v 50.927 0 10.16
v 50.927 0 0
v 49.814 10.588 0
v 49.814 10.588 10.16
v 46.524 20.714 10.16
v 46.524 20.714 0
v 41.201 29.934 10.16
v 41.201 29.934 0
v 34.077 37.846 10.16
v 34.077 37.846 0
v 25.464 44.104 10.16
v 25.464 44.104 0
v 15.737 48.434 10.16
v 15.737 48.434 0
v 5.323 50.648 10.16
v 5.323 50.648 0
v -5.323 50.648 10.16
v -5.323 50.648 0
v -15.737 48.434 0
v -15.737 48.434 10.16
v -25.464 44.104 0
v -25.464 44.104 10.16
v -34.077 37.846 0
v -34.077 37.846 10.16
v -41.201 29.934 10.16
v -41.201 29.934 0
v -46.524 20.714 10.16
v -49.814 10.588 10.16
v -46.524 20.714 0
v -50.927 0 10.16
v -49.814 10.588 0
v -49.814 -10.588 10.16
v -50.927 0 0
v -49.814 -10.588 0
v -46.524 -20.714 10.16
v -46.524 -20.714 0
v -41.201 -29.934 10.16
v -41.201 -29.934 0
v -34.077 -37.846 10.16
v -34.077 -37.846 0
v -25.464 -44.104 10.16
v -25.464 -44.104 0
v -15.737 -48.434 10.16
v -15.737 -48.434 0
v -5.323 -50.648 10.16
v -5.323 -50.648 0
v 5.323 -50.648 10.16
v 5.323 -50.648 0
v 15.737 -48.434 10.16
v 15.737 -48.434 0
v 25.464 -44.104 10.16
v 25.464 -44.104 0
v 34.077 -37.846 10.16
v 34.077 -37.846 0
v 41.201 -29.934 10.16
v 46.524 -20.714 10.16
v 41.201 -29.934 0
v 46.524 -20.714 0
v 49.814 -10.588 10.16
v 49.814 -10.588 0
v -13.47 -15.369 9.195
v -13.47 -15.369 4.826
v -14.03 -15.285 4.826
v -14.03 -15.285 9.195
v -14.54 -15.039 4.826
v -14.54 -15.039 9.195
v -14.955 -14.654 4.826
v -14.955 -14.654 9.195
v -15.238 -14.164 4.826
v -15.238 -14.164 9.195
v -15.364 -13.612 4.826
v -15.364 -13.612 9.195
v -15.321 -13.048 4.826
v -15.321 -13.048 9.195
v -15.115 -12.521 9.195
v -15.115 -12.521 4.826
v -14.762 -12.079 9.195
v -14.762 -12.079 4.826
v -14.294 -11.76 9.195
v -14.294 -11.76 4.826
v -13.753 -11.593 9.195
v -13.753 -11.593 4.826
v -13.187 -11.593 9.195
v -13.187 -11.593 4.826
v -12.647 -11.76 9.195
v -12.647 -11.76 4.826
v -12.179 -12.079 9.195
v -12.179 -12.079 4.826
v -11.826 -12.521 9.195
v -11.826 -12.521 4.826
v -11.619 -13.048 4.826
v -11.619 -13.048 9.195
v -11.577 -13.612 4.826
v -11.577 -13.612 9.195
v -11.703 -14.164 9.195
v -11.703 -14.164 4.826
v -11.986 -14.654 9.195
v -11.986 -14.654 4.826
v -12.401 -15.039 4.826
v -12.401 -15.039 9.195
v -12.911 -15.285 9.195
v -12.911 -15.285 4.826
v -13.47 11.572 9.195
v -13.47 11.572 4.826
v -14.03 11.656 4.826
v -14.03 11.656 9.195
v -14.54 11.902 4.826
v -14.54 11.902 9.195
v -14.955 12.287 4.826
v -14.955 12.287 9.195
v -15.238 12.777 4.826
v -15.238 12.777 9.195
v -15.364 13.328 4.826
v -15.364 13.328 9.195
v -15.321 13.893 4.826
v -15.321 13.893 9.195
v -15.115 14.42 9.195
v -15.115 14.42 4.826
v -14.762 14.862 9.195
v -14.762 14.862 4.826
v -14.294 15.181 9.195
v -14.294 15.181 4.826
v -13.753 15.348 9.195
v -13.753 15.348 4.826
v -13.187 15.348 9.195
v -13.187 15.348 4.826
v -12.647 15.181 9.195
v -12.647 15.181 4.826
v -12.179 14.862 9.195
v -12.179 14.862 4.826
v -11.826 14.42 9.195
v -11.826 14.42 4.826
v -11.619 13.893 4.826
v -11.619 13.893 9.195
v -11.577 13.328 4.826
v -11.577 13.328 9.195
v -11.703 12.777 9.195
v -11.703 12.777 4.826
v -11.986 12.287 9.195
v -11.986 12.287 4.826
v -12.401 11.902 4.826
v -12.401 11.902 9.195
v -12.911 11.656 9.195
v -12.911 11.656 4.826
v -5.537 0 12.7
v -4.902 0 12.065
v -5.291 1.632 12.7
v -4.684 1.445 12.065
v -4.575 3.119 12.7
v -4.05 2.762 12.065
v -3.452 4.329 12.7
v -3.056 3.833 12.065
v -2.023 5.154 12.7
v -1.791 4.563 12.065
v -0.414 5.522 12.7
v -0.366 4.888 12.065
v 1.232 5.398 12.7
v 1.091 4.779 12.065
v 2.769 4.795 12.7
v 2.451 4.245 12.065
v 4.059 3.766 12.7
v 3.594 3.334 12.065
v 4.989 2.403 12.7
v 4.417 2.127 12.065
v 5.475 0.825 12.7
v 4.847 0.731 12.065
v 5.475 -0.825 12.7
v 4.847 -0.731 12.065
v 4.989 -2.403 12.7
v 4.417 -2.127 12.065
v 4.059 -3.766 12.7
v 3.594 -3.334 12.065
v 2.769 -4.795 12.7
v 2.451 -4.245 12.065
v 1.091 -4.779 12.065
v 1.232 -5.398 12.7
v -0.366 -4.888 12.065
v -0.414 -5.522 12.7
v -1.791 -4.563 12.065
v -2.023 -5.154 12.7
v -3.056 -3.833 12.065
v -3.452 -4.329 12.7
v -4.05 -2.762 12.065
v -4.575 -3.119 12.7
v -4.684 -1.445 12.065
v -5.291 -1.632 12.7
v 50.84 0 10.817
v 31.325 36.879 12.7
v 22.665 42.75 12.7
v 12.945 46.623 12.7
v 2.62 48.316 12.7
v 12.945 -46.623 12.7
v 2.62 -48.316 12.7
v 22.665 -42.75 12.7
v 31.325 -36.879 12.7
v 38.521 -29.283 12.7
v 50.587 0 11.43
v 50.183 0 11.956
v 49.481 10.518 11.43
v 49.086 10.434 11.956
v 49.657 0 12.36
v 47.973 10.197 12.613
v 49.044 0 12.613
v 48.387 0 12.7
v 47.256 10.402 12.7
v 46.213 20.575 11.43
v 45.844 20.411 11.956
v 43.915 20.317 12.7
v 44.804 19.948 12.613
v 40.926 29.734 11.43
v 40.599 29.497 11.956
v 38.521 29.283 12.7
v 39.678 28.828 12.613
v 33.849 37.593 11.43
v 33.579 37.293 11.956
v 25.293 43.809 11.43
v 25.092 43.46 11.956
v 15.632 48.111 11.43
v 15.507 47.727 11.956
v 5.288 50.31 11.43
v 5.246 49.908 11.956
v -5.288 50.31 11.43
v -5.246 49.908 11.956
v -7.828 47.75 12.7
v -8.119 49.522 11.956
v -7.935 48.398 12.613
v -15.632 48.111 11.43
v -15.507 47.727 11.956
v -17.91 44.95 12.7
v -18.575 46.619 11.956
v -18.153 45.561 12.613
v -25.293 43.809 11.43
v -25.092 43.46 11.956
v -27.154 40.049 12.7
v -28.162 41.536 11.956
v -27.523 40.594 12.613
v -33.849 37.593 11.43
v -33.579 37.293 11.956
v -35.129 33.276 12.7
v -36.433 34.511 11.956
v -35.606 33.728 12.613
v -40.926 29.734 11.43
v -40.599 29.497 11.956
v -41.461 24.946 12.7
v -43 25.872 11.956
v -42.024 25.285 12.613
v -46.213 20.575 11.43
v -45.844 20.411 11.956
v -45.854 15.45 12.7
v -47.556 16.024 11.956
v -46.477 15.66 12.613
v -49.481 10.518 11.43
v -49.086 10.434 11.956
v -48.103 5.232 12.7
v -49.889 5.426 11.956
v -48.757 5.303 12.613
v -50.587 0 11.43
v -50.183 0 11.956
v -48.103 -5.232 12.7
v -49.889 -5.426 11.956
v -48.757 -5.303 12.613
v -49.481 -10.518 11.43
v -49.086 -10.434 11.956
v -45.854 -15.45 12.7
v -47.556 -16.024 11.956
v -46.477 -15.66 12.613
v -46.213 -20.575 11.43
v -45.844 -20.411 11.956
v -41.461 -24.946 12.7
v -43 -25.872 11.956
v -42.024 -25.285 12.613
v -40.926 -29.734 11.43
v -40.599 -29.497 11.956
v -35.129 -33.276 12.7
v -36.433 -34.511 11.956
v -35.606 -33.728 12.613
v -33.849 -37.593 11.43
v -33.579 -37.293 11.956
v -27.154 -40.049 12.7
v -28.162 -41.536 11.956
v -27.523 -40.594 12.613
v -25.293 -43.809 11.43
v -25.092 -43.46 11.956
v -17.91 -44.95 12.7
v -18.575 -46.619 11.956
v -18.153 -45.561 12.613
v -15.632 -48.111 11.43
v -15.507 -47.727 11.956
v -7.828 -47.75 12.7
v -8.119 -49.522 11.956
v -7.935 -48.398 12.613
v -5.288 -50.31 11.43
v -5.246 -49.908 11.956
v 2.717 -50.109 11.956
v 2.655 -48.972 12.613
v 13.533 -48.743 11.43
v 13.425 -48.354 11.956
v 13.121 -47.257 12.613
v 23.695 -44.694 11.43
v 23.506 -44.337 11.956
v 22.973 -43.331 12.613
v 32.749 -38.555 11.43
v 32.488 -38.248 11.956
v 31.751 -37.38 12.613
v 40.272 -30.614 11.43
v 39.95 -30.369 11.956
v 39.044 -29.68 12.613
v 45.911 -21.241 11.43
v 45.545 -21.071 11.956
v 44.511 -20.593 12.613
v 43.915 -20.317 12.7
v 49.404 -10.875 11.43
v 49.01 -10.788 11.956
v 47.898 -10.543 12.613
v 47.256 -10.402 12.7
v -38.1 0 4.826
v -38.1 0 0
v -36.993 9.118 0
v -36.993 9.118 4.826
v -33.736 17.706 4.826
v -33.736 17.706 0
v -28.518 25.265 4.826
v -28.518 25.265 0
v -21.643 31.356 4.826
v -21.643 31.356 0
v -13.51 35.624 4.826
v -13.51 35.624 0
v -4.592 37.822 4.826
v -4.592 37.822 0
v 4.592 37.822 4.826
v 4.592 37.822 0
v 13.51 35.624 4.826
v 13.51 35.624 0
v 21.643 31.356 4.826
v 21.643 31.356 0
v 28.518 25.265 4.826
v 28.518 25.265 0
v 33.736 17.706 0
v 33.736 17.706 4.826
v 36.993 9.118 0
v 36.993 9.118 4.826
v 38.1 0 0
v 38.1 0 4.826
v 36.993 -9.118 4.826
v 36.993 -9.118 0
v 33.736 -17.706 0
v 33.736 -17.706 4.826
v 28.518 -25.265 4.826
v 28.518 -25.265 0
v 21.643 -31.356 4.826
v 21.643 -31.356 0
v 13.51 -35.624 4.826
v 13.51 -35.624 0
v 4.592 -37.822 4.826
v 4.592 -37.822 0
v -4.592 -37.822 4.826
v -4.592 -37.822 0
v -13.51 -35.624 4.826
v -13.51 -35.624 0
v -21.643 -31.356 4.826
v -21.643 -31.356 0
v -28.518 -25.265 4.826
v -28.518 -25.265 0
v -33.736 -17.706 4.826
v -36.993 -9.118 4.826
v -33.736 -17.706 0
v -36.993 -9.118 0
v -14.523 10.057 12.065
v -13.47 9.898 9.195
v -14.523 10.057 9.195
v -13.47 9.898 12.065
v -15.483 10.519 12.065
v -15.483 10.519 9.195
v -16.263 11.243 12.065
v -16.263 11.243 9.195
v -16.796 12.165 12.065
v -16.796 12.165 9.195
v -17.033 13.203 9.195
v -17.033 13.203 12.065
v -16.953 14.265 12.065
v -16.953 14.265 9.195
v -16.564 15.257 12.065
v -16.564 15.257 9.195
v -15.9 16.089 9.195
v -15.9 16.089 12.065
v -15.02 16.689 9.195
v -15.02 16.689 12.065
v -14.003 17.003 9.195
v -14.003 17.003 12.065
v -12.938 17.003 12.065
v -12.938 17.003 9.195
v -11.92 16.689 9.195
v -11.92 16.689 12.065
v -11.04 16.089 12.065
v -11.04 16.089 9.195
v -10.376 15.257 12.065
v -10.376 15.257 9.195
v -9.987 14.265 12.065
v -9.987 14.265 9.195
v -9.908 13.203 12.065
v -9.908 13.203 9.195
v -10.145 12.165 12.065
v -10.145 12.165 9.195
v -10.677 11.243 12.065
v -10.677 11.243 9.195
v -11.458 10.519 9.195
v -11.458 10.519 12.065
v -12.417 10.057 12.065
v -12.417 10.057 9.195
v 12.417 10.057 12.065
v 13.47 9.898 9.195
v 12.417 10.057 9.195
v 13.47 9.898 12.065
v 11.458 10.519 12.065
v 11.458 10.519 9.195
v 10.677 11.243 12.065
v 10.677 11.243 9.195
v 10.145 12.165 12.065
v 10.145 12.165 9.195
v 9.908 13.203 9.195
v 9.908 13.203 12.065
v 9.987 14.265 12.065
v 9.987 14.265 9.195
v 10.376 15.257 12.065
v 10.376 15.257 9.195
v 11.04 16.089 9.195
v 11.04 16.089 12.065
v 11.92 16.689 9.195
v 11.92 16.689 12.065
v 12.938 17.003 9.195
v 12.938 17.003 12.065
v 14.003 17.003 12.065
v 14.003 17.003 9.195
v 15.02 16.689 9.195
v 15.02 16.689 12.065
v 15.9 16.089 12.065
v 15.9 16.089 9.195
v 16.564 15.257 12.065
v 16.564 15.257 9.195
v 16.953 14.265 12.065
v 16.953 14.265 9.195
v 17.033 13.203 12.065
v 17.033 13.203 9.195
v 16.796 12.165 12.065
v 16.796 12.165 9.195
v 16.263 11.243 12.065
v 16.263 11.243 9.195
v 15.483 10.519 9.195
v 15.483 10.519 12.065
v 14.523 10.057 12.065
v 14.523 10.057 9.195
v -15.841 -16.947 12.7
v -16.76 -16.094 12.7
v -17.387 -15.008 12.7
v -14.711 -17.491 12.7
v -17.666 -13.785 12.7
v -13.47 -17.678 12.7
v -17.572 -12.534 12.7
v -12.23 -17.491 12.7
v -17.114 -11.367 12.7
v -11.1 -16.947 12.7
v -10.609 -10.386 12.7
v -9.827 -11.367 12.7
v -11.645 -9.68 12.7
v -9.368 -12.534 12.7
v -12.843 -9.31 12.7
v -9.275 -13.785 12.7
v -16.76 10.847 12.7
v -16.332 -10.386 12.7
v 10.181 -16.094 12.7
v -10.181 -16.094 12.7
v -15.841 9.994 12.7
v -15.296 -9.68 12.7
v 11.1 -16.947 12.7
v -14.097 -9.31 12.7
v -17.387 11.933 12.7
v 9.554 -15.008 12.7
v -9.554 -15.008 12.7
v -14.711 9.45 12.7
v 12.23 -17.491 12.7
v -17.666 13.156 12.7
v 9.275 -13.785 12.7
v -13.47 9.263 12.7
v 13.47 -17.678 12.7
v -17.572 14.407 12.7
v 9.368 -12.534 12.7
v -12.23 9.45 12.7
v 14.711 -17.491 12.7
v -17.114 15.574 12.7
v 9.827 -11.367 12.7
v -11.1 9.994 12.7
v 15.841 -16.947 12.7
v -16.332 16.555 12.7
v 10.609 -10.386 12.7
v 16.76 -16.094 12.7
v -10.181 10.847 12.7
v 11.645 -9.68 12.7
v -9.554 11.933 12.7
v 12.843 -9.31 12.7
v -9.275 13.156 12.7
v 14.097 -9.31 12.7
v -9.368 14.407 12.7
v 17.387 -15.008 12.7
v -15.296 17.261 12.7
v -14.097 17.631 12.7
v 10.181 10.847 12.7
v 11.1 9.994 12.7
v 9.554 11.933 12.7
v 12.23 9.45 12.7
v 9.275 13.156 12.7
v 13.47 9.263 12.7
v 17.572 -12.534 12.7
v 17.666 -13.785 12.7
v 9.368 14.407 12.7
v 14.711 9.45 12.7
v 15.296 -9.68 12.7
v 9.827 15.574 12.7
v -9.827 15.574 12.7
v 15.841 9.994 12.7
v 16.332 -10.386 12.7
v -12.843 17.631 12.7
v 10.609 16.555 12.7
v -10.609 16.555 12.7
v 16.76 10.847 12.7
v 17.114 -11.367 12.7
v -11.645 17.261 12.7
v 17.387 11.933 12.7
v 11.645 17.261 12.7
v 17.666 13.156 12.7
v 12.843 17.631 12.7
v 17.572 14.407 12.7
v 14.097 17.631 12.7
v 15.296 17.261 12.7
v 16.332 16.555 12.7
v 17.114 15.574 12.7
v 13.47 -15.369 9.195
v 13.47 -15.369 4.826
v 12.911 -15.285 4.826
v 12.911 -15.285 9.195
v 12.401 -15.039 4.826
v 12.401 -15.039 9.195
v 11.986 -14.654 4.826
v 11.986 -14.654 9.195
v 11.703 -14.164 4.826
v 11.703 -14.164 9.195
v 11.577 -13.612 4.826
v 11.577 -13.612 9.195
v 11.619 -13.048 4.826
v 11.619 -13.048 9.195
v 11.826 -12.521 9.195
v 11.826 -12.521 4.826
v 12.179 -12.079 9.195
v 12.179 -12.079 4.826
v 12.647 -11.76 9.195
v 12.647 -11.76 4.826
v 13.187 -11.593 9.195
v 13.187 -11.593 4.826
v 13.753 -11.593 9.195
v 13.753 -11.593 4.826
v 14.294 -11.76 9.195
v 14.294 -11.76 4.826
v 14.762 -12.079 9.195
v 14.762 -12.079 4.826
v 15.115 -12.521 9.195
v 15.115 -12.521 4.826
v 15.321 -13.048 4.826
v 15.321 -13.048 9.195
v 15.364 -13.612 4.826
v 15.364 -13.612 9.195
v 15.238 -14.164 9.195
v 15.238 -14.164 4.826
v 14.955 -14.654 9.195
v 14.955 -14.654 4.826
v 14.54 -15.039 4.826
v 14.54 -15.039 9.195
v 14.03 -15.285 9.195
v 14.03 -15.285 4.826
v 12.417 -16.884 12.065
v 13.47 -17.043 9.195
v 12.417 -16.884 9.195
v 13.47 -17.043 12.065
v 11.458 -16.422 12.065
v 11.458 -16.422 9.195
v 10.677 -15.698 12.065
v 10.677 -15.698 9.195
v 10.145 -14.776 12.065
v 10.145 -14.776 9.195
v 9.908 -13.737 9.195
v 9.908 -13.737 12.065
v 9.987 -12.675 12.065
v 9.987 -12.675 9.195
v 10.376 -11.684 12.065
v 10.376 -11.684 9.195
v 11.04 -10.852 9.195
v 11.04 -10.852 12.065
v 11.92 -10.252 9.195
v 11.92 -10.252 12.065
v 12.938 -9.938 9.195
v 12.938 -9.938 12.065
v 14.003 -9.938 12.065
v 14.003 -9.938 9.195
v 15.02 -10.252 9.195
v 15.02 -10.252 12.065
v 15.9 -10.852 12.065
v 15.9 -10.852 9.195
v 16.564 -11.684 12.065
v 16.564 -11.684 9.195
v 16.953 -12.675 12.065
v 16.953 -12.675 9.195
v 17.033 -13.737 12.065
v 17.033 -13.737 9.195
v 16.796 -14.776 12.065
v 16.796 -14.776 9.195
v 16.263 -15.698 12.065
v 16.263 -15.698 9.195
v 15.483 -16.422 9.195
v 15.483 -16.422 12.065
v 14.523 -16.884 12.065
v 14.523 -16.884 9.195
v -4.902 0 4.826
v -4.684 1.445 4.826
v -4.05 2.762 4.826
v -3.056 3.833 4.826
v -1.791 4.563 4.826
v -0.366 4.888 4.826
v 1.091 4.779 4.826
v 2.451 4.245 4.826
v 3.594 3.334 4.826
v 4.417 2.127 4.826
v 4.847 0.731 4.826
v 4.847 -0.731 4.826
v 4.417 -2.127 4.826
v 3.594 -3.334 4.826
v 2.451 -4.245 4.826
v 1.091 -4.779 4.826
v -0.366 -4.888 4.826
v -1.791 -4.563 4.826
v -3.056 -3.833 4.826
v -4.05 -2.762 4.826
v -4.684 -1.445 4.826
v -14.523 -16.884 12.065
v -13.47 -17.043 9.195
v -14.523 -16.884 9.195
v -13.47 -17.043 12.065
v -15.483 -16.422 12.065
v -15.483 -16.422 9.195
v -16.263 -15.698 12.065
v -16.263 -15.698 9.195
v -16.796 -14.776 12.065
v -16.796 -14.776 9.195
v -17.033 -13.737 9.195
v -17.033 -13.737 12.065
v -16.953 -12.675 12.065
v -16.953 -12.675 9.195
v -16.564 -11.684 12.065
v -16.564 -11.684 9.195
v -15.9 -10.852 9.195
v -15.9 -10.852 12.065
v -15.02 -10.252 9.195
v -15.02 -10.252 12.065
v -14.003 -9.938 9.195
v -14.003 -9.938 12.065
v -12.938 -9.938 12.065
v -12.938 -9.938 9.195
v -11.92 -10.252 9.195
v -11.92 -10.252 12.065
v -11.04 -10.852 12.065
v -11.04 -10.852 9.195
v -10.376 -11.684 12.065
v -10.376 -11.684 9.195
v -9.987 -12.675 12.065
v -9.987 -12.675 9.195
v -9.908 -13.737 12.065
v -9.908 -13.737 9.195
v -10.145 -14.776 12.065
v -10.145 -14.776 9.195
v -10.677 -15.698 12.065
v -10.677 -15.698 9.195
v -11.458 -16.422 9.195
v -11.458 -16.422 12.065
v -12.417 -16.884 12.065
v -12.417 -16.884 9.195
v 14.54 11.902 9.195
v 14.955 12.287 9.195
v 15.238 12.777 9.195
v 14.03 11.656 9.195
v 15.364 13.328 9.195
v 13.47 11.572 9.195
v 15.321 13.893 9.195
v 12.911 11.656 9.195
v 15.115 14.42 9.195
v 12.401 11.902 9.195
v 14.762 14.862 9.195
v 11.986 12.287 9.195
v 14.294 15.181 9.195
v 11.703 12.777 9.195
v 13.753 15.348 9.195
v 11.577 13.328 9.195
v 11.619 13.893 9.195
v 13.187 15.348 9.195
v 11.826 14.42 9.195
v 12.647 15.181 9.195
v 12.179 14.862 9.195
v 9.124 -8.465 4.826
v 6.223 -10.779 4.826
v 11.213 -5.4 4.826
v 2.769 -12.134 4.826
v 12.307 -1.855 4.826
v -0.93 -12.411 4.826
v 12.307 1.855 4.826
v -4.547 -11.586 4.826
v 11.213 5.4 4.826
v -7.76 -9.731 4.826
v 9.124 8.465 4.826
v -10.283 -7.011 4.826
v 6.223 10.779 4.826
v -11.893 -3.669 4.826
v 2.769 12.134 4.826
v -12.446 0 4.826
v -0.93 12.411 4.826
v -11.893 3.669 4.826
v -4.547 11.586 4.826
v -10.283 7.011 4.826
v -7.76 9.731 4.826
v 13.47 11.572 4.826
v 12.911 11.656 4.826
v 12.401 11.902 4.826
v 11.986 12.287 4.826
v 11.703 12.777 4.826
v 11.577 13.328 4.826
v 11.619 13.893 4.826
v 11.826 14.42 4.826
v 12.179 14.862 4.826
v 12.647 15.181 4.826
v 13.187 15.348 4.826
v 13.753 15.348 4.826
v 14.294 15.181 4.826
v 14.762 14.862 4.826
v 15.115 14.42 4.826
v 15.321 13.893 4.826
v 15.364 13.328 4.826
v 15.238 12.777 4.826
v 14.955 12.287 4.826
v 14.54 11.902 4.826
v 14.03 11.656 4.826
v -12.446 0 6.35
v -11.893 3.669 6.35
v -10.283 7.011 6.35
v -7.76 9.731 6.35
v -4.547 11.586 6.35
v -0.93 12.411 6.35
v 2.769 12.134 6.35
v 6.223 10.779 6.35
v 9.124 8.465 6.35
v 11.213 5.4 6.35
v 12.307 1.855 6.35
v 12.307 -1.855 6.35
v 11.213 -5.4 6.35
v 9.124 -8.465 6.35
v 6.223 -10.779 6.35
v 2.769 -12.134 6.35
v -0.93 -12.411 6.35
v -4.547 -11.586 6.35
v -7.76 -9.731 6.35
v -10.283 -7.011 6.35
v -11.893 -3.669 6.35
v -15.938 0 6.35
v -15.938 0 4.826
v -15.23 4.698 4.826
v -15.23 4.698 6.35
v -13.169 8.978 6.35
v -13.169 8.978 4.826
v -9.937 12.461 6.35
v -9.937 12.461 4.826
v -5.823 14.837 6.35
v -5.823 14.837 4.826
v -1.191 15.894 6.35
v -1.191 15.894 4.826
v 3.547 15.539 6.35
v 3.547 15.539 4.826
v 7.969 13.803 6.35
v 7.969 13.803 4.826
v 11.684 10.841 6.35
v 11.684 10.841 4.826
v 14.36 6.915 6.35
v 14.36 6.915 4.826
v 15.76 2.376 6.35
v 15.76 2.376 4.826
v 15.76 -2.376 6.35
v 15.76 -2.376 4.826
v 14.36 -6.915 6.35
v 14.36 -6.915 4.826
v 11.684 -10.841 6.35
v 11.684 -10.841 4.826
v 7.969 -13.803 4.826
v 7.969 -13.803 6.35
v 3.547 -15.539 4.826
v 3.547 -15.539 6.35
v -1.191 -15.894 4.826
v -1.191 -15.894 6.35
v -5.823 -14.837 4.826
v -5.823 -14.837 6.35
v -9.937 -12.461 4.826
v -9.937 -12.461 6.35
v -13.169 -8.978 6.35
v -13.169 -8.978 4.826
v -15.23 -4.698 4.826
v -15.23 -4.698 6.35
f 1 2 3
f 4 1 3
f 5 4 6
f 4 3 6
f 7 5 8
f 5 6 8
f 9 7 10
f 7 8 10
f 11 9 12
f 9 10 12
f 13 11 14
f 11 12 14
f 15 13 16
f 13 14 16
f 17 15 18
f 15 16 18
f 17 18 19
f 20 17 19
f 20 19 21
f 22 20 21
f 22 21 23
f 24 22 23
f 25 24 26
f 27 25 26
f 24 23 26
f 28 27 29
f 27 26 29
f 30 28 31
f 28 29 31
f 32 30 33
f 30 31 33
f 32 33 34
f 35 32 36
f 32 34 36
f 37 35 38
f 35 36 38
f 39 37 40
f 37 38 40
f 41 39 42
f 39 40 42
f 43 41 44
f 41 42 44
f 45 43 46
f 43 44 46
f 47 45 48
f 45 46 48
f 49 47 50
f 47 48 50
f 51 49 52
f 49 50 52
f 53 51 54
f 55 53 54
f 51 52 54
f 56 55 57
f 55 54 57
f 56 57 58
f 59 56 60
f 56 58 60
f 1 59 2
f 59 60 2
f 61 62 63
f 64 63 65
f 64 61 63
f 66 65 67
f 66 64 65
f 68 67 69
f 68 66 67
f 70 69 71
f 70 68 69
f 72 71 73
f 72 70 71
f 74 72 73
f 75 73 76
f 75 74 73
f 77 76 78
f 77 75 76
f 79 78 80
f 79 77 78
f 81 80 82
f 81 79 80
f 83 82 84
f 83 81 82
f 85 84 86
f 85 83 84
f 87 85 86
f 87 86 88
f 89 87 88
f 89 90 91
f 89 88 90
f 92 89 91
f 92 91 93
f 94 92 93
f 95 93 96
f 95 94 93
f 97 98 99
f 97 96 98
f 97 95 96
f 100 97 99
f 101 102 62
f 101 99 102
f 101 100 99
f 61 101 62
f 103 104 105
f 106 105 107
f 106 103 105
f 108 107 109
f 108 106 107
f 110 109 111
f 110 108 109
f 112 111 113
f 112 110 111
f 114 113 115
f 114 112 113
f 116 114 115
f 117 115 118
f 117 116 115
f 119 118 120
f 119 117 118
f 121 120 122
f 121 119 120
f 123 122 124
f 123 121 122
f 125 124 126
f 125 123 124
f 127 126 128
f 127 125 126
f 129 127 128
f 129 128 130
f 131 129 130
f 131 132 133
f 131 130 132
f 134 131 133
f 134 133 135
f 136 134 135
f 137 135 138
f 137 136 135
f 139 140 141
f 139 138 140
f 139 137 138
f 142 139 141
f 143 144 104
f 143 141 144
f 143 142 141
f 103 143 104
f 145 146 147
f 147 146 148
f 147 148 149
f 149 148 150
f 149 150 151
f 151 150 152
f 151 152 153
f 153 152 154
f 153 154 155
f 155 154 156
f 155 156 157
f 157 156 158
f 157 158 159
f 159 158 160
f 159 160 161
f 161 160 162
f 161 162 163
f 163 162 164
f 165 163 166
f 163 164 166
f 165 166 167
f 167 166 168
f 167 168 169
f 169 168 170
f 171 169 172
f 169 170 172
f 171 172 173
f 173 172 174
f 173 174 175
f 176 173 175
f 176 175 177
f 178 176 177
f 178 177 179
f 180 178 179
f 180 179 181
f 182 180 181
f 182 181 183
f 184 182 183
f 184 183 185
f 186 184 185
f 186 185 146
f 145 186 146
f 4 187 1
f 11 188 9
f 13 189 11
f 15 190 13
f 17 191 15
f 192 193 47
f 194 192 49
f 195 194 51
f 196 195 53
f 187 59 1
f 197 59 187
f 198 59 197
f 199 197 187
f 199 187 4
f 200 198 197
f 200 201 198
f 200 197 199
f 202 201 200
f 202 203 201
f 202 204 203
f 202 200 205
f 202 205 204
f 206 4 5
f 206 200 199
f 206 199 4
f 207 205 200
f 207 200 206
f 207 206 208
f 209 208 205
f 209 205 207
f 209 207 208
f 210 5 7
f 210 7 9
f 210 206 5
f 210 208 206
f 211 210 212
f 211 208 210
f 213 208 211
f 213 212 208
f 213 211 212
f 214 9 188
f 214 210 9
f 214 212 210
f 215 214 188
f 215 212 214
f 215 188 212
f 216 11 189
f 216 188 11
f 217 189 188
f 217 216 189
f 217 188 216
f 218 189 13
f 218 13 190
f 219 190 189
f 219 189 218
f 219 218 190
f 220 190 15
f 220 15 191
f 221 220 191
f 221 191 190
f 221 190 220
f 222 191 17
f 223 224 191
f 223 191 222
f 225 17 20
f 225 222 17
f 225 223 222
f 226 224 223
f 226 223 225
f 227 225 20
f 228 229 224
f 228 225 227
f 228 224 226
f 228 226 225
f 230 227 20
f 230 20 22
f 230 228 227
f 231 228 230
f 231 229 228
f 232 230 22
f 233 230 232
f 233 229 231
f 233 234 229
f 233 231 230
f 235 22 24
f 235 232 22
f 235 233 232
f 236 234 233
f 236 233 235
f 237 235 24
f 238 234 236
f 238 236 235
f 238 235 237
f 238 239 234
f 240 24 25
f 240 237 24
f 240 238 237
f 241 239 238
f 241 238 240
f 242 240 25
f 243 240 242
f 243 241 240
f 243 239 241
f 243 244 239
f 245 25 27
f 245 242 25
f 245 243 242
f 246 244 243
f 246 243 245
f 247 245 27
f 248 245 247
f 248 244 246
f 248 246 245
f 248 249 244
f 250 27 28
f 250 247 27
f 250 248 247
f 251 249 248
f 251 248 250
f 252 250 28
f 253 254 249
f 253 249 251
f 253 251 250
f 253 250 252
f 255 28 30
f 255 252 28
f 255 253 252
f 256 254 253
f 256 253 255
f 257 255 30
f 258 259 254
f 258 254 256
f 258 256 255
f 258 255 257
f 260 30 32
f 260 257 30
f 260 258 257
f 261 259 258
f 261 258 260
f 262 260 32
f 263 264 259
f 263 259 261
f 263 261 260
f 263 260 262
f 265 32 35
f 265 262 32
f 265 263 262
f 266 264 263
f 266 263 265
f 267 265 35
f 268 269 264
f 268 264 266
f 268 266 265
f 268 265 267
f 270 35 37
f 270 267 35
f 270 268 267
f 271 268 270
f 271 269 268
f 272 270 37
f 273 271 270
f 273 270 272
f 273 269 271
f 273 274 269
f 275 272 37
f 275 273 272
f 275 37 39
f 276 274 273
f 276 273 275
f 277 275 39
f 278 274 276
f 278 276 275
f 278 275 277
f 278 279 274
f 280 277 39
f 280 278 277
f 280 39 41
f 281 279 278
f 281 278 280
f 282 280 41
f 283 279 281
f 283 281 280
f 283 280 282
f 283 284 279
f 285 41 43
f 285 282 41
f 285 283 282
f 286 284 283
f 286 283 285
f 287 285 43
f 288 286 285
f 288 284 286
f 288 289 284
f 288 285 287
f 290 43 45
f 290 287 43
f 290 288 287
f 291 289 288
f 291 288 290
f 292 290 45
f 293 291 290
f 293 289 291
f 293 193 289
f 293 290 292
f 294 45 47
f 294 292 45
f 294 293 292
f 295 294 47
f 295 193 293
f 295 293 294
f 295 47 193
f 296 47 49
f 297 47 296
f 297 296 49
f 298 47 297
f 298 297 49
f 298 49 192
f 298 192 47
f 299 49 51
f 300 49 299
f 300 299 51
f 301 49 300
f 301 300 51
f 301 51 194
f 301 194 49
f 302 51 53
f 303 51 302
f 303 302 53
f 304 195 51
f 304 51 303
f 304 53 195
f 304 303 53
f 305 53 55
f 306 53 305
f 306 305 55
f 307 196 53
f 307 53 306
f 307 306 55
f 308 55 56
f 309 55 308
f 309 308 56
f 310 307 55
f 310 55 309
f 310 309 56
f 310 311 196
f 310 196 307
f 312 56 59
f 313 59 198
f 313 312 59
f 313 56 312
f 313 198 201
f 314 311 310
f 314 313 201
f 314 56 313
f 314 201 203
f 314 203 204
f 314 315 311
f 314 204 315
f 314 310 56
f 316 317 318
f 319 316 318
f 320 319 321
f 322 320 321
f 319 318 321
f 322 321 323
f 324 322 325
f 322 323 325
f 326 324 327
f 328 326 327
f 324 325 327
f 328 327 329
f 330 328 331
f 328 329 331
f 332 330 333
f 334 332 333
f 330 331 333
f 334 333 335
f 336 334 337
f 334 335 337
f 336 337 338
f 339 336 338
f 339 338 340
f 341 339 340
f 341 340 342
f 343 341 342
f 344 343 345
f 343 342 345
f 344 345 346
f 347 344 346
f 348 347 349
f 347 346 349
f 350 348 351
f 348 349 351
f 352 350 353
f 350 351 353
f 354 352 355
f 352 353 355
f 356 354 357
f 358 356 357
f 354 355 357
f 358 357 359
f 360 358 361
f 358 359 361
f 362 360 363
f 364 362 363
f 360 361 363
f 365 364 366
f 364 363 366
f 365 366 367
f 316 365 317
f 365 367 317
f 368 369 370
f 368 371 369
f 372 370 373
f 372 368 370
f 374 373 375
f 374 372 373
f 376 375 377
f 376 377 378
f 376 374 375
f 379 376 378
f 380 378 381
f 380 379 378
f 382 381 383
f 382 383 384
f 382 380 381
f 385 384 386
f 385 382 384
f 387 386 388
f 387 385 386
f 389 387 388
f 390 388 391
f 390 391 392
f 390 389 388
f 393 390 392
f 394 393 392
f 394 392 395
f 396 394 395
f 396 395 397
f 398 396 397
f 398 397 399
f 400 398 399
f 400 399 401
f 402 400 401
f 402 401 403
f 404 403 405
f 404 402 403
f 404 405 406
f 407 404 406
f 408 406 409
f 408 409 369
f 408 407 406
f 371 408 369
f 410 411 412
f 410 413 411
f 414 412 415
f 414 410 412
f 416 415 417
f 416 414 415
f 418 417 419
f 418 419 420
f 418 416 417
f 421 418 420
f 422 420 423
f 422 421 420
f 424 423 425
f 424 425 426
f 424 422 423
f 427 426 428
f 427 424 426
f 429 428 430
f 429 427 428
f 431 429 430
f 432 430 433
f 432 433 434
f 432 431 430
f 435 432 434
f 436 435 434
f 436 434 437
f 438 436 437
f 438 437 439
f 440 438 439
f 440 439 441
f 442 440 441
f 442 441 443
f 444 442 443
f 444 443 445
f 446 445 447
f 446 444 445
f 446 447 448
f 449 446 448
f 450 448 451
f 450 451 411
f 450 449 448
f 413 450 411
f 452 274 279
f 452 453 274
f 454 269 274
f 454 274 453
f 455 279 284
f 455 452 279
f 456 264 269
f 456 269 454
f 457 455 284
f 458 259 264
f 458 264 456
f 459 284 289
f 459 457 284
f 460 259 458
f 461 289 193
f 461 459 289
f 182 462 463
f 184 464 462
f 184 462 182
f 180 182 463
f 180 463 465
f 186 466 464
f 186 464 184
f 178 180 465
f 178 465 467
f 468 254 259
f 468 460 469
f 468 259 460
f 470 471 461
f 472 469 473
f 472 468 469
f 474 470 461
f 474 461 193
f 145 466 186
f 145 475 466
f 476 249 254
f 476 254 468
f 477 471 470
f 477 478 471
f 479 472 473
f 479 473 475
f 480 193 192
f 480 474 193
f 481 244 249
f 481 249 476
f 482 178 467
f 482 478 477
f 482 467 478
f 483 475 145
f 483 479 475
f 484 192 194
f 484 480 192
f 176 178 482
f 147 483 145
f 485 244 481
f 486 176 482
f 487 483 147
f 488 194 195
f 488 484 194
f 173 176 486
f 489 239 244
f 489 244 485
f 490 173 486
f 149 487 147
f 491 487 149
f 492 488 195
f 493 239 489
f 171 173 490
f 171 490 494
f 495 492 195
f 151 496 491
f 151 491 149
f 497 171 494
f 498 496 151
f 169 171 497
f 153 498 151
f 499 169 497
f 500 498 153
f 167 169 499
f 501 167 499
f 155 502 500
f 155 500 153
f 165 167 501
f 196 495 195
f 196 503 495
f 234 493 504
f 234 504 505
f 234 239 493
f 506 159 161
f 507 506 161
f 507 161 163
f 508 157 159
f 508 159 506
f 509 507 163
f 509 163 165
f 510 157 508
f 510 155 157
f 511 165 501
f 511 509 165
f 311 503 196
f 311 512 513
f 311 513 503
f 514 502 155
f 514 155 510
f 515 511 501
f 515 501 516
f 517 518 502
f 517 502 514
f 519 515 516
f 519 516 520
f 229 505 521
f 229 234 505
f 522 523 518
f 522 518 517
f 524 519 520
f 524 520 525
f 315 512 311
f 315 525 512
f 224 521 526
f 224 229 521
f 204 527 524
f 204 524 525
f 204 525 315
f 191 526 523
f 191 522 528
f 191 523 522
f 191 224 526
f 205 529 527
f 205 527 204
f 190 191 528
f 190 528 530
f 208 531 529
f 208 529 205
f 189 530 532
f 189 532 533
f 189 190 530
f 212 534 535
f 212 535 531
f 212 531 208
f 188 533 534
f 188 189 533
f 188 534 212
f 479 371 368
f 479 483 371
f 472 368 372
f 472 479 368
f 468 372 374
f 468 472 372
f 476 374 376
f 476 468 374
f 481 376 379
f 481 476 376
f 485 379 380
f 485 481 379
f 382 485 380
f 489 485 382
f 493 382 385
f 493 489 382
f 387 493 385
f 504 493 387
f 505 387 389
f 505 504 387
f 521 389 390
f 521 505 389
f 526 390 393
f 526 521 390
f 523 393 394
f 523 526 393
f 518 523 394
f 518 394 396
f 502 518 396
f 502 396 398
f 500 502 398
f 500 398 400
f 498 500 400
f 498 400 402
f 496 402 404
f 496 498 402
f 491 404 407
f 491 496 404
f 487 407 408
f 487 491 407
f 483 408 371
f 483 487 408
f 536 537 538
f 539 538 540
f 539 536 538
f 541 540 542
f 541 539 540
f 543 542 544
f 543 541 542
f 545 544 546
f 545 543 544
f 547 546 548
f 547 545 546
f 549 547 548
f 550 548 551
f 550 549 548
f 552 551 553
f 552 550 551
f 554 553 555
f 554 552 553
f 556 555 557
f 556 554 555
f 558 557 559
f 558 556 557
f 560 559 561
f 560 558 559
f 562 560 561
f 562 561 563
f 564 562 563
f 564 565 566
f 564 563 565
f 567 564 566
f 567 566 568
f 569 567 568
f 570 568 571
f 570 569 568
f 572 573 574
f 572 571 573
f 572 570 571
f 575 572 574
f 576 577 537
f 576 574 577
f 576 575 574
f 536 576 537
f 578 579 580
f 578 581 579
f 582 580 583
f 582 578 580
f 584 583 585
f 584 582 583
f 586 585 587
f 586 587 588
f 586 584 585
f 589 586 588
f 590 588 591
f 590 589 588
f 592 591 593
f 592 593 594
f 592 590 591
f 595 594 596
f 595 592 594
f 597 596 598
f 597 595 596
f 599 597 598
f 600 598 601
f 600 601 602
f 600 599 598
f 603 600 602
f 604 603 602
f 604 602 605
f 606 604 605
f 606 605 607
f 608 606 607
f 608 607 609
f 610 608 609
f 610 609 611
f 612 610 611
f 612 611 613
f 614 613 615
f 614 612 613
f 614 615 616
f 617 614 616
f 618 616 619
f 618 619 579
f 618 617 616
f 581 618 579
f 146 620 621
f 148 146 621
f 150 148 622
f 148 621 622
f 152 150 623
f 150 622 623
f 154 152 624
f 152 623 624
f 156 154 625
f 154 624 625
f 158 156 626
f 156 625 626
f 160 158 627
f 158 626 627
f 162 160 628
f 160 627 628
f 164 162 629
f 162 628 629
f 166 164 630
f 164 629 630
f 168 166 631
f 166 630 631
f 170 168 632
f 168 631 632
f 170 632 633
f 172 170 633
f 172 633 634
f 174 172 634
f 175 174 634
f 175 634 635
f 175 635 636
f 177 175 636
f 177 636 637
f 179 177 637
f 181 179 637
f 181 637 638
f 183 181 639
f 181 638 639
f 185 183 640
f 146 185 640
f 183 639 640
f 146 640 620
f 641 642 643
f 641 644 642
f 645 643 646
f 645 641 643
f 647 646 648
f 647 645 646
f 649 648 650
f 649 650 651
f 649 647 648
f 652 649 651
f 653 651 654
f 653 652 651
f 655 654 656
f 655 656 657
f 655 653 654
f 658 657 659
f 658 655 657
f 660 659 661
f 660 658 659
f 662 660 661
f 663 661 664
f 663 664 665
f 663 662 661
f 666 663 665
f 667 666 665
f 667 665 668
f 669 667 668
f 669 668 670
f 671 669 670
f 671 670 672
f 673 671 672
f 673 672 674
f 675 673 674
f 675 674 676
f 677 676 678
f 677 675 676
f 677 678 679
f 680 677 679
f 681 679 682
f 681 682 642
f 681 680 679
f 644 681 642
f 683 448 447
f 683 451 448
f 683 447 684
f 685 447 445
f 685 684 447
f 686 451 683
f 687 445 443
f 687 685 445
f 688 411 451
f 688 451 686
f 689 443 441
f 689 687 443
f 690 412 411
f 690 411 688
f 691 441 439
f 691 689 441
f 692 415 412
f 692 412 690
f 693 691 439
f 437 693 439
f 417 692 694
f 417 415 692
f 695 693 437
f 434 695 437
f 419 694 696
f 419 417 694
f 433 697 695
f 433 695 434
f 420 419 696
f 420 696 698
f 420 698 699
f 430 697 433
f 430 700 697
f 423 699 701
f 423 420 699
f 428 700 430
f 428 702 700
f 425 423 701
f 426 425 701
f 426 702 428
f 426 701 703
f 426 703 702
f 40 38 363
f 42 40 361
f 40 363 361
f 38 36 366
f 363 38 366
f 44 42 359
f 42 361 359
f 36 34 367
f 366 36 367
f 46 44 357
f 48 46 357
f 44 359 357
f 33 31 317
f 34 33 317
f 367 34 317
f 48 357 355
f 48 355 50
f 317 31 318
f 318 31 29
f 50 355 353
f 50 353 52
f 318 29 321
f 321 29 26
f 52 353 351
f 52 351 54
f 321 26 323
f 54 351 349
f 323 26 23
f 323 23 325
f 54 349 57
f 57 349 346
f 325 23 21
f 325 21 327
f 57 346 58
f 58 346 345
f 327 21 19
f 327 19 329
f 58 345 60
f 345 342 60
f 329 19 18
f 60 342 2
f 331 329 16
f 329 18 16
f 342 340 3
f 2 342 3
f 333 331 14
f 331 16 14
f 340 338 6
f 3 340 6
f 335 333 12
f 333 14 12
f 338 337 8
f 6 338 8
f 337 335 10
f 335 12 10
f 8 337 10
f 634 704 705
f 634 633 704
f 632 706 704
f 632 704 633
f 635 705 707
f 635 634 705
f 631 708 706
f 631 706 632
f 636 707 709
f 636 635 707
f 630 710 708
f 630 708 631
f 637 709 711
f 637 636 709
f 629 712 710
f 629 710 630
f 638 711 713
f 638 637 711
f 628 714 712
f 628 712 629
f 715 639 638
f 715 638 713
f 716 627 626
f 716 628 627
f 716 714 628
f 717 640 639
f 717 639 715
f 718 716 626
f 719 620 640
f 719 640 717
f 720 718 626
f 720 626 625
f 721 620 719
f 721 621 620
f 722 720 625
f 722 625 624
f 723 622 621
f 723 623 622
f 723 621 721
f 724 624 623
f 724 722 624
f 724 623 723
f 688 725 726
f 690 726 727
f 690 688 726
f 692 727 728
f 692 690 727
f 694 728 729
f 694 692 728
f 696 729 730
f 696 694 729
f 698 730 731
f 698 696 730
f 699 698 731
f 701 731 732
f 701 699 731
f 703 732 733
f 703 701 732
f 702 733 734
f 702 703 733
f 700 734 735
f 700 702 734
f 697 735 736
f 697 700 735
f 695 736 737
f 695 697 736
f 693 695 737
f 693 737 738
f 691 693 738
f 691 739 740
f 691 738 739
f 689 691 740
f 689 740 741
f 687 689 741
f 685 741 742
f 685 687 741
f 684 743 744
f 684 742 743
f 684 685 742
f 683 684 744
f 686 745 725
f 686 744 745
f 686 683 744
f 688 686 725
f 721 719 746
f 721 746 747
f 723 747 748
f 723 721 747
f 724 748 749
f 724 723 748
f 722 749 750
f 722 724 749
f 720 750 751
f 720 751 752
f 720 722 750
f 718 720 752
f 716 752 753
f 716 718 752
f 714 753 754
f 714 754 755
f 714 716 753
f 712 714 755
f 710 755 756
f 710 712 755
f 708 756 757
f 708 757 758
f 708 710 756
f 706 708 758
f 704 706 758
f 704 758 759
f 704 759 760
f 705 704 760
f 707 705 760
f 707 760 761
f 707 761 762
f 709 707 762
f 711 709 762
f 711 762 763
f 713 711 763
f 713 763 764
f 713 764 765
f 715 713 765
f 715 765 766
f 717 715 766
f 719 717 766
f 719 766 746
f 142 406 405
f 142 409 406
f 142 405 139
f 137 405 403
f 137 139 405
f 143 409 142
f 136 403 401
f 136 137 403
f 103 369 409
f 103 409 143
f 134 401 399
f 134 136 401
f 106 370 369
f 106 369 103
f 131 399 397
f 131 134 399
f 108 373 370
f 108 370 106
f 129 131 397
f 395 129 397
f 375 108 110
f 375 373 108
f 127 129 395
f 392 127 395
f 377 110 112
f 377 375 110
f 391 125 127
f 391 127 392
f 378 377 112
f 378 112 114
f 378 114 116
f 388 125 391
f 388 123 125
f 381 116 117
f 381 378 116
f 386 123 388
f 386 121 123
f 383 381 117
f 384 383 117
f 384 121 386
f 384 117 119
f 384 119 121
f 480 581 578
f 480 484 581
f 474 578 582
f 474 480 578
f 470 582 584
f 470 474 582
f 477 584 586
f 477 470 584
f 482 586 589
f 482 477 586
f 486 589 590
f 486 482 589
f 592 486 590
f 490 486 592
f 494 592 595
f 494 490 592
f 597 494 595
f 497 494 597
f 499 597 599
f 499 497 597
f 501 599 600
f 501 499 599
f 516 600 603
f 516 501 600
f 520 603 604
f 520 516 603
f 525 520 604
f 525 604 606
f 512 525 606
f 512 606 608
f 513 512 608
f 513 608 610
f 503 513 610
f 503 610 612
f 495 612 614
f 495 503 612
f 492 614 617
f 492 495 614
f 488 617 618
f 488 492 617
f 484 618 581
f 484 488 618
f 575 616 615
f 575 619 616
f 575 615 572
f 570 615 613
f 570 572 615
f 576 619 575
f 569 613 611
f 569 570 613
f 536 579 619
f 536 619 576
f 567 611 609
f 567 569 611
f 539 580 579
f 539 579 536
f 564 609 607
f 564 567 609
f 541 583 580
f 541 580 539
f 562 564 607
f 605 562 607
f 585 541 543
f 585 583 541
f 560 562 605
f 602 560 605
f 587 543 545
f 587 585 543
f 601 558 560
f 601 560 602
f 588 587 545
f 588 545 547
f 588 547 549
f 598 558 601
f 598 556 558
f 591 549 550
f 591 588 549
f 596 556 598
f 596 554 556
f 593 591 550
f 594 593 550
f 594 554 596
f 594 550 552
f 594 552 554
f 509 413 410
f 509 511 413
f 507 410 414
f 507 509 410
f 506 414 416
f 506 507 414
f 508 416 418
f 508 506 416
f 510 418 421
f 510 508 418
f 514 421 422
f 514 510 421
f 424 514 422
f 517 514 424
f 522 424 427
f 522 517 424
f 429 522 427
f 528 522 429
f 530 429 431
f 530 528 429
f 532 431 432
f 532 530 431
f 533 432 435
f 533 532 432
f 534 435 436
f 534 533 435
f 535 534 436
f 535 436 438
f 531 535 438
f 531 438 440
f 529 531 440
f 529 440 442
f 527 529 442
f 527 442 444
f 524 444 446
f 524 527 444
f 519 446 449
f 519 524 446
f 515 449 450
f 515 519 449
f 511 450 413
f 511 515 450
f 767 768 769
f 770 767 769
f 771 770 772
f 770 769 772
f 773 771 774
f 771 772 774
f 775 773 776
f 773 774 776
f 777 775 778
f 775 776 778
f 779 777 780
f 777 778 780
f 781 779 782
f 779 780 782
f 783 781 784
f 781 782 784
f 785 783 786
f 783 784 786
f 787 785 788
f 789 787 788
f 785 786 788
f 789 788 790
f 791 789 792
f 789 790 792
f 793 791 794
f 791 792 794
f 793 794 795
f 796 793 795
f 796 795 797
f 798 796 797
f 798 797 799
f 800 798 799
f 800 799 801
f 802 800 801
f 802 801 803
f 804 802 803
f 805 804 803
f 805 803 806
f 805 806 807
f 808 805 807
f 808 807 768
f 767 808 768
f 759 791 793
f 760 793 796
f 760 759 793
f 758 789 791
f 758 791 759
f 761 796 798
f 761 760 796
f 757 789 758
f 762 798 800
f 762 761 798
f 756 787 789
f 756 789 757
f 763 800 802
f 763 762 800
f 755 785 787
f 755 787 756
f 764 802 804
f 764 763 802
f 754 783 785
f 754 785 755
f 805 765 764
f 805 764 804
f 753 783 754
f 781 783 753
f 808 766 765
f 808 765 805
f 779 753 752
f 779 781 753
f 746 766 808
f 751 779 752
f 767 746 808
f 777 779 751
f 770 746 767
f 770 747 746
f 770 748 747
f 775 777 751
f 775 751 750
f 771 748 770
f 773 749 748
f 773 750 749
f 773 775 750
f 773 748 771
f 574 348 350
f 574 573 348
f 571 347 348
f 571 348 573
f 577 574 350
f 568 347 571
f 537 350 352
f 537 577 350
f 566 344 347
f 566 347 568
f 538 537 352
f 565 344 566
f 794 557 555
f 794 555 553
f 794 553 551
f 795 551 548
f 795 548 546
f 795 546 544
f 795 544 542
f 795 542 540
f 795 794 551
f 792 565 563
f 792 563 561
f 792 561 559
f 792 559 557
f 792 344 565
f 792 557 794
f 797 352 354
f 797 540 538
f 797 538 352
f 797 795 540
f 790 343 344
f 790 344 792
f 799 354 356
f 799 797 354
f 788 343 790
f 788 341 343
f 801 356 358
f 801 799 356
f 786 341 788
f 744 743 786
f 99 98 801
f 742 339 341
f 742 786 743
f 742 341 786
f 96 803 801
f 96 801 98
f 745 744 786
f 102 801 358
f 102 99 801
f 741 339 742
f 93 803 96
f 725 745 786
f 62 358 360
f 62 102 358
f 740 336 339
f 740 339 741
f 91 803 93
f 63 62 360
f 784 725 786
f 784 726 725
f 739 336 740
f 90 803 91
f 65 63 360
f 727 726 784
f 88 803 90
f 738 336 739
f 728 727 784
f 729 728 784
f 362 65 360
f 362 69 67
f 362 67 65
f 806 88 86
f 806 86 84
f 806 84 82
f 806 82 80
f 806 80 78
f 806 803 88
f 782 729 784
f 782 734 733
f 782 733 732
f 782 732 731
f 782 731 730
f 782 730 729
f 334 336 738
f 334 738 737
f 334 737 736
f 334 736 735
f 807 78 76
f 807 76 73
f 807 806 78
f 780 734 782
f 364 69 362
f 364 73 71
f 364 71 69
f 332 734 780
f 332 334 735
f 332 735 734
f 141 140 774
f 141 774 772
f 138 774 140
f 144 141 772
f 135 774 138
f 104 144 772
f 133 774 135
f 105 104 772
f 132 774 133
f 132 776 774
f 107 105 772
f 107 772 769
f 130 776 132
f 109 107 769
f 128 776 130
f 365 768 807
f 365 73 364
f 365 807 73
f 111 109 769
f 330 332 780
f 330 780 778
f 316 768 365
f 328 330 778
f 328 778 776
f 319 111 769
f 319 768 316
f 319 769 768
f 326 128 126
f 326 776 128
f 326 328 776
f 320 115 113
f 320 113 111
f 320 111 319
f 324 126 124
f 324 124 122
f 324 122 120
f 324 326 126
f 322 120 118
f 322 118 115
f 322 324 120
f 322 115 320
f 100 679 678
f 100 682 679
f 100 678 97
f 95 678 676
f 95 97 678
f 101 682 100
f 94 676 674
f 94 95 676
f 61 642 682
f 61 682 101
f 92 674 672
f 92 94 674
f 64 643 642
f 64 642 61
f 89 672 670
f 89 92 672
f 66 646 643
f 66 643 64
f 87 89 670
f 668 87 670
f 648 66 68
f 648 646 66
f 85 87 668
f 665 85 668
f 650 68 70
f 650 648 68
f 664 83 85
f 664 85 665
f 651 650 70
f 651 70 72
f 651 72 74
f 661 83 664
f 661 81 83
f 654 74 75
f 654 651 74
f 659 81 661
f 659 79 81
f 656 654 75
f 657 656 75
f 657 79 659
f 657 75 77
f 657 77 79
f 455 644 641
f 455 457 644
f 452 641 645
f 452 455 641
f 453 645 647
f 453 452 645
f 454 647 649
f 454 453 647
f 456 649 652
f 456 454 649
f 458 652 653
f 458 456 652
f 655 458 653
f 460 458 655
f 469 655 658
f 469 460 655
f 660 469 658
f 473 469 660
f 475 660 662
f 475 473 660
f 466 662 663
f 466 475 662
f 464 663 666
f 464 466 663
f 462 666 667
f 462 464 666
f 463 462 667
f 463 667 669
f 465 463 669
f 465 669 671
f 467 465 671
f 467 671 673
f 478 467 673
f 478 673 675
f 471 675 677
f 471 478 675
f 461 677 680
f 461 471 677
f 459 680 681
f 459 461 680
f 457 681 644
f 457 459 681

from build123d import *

# Parameters (mm, degrees)
SKETCH1_R                                     = 50.927
BOSS_EXTRUDE1_DEPTH                           = 12.7
W_0_386_DIAMETER_HOLE1_D                      = 9.8044
W_0_386_DIAMETER_HOLE1_CSINK_D                = 11.0744
W_0_386_DIAMETER_HOLE1_CSINK_ANGLE            = 90
CBORE_FOR_6_SOCKET_HEAD_CAP_SCREW1_AT_2_COUNT = 2
CBORE_FOR_6_SOCKET_HEAD_CAP_SCREW1_AT_2_PITCH = 38.1
CBORE_FOR_6_SOCKET_HEAD_CAP_SCREW1_AT_3_COUNT = 2
CBORE_FOR_6_SOCKET_HEAD_CAP_SCREW1_AT_3_PITCH = 26.940768363
CBORE_FOR_6_SOCKET_HEAD_CAP_SCREW1_AT_4_COUNT = 2
CBORE_FOR_6_SOCKET_HEAD_CAP_SCREW1_AT_4_PITCH = 26.940768363
FILLET1_R                                     = 2.54
SKETCH7_R                                     = 15.9385
SKETCH7_R_2                                   = 12.446
CUT_EXTRUDE2_DEPTH                            = 6.35
SKETCH6_R                                     = 38.1
CUT_EXTRUDE1_DEPTH                            = 4.826


with BuildPart() as part:
    # Sketch1 → Boss-Extrude1 (new body)
    with BuildSketch(Plane.XY):
        Circle(SKETCH1_R)
    extrude(amount=BOSS_EXTRUDE1_DEPTH)

    # W (0.386) Diameter Hole1 (through all)
    with Locations(Plane.XY.offset(12.7)):
        with Locations((0, 0)):
            CounterSinkHole(W_0_386_DIAMETER_HOLE1_D / 2, W_0_386_DIAMETER_HOLE1_CSINK_D / 2, counter_sink_angle=W_0_386_DIAMETER_HOLE1_CSINK_ANGLE)

    # Sketch5 → CBORE for #6 Socket Head Cap Screw1 (revolve, cut)
    with BuildSketch(Plane(origin=(13.470384182, 13.470384182, 12.7), x_dir=(0, -1, 0), z_dir=(1, 0, 0))):
        Polygon((0, 0), (0, 12.7), (1.89865, 12.7), (1.89865, 3.5052), (3.57251, 3.5052), (3.57251, 0.635), (4.20751, 0), align=None)
    cbore_for_6_socket_head_cap_screw1 = revolve(axis=Axis((13.470384182, 13.470384182, 19.05), (0, 0, -1)), mode=Mode.SUBTRACT)

    # CBORE for #6 Socket Head Cap Screw1 at 2: CBORE for #6 Socket Head Cap Screw1 ×2
    with Locations(*[Vector(-0.707106781, -0.707106781, 0) * (i * CBORE_FOR_6_SOCKET_HEAD_CAP_SCREW1_AT_2_PITCH) for i in range(1, CBORE_FOR_6_SOCKET_HEAD_CAP_SCREW1_AT_2_COUNT)]):
        add(cbore_for_6_socket_head_cap_screw1, mode=Mode.SUBTRACT)

    # CBORE for #6 Socket Head Cap Screw1 at 3: CBORE for #6 Socket Head Cap Screw1 ×2
    with Locations(*[(-i * CBORE_FOR_6_SOCKET_HEAD_CAP_SCREW1_AT_3_PITCH, 0, 0) for i in range(1, CBORE_FOR_6_SOCKET_HEAD_CAP_SCREW1_AT_3_COUNT)]):
        add(cbore_for_6_socket_head_cap_screw1, mode=Mode.SUBTRACT)

    # CBORE for #6 Socket Head Cap Screw1 at 4: CBORE for #6 Socket Head Cap Screw1 ×2
    with Locations(*[(0, -i * CBORE_FOR_6_SOCKET_HEAD_CAP_SCREW1_AT_4_PITCH, 0) for i in range(1, CBORE_FOR_6_SOCKET_HEAD_CAP_SCREW1_AT_4_COUNT)]):
        add(cbore_for_6_socket_head_cap_screw1, mode=Mode.SUBTRACT)

    # Fillet1
    fillet1_edges = [part.edges().sort_by_distance(p)[0] for p in [
        (-50.927, 0, 12.7),
    ]]
    fillet(fillet1_edges, radius=FILLET1_R)

    # Sketch7 → Cut-Extrude2 (cut)
    with BuildSketch(Plane(origin=(0, 0, 0), x_dir=(-1, 0, 0), z_dir=(0, 0, -1))):
        Circle(SKETCH7_R)
        Circle(SKETCH7_R_2, mode=Mode.SUBTRACT)
    extrude(amount=-CUT_EXTRUDE2_DEPTH, mode=Mode.SUBTRACT)

    # Sketch6 → Cut-Extrude1 (cut)
    with BuildSketch(Plane(origin=(0, 0, 0), x_dir=(-1, 0, 0), z_dir=(0, 0, -1))):
        Circle(SKETCH6_R)
    extrude(amount=-CUT_EXTRUDE1_DEPTH, mode=Mode.SUBTRACT)


solid = part.part
